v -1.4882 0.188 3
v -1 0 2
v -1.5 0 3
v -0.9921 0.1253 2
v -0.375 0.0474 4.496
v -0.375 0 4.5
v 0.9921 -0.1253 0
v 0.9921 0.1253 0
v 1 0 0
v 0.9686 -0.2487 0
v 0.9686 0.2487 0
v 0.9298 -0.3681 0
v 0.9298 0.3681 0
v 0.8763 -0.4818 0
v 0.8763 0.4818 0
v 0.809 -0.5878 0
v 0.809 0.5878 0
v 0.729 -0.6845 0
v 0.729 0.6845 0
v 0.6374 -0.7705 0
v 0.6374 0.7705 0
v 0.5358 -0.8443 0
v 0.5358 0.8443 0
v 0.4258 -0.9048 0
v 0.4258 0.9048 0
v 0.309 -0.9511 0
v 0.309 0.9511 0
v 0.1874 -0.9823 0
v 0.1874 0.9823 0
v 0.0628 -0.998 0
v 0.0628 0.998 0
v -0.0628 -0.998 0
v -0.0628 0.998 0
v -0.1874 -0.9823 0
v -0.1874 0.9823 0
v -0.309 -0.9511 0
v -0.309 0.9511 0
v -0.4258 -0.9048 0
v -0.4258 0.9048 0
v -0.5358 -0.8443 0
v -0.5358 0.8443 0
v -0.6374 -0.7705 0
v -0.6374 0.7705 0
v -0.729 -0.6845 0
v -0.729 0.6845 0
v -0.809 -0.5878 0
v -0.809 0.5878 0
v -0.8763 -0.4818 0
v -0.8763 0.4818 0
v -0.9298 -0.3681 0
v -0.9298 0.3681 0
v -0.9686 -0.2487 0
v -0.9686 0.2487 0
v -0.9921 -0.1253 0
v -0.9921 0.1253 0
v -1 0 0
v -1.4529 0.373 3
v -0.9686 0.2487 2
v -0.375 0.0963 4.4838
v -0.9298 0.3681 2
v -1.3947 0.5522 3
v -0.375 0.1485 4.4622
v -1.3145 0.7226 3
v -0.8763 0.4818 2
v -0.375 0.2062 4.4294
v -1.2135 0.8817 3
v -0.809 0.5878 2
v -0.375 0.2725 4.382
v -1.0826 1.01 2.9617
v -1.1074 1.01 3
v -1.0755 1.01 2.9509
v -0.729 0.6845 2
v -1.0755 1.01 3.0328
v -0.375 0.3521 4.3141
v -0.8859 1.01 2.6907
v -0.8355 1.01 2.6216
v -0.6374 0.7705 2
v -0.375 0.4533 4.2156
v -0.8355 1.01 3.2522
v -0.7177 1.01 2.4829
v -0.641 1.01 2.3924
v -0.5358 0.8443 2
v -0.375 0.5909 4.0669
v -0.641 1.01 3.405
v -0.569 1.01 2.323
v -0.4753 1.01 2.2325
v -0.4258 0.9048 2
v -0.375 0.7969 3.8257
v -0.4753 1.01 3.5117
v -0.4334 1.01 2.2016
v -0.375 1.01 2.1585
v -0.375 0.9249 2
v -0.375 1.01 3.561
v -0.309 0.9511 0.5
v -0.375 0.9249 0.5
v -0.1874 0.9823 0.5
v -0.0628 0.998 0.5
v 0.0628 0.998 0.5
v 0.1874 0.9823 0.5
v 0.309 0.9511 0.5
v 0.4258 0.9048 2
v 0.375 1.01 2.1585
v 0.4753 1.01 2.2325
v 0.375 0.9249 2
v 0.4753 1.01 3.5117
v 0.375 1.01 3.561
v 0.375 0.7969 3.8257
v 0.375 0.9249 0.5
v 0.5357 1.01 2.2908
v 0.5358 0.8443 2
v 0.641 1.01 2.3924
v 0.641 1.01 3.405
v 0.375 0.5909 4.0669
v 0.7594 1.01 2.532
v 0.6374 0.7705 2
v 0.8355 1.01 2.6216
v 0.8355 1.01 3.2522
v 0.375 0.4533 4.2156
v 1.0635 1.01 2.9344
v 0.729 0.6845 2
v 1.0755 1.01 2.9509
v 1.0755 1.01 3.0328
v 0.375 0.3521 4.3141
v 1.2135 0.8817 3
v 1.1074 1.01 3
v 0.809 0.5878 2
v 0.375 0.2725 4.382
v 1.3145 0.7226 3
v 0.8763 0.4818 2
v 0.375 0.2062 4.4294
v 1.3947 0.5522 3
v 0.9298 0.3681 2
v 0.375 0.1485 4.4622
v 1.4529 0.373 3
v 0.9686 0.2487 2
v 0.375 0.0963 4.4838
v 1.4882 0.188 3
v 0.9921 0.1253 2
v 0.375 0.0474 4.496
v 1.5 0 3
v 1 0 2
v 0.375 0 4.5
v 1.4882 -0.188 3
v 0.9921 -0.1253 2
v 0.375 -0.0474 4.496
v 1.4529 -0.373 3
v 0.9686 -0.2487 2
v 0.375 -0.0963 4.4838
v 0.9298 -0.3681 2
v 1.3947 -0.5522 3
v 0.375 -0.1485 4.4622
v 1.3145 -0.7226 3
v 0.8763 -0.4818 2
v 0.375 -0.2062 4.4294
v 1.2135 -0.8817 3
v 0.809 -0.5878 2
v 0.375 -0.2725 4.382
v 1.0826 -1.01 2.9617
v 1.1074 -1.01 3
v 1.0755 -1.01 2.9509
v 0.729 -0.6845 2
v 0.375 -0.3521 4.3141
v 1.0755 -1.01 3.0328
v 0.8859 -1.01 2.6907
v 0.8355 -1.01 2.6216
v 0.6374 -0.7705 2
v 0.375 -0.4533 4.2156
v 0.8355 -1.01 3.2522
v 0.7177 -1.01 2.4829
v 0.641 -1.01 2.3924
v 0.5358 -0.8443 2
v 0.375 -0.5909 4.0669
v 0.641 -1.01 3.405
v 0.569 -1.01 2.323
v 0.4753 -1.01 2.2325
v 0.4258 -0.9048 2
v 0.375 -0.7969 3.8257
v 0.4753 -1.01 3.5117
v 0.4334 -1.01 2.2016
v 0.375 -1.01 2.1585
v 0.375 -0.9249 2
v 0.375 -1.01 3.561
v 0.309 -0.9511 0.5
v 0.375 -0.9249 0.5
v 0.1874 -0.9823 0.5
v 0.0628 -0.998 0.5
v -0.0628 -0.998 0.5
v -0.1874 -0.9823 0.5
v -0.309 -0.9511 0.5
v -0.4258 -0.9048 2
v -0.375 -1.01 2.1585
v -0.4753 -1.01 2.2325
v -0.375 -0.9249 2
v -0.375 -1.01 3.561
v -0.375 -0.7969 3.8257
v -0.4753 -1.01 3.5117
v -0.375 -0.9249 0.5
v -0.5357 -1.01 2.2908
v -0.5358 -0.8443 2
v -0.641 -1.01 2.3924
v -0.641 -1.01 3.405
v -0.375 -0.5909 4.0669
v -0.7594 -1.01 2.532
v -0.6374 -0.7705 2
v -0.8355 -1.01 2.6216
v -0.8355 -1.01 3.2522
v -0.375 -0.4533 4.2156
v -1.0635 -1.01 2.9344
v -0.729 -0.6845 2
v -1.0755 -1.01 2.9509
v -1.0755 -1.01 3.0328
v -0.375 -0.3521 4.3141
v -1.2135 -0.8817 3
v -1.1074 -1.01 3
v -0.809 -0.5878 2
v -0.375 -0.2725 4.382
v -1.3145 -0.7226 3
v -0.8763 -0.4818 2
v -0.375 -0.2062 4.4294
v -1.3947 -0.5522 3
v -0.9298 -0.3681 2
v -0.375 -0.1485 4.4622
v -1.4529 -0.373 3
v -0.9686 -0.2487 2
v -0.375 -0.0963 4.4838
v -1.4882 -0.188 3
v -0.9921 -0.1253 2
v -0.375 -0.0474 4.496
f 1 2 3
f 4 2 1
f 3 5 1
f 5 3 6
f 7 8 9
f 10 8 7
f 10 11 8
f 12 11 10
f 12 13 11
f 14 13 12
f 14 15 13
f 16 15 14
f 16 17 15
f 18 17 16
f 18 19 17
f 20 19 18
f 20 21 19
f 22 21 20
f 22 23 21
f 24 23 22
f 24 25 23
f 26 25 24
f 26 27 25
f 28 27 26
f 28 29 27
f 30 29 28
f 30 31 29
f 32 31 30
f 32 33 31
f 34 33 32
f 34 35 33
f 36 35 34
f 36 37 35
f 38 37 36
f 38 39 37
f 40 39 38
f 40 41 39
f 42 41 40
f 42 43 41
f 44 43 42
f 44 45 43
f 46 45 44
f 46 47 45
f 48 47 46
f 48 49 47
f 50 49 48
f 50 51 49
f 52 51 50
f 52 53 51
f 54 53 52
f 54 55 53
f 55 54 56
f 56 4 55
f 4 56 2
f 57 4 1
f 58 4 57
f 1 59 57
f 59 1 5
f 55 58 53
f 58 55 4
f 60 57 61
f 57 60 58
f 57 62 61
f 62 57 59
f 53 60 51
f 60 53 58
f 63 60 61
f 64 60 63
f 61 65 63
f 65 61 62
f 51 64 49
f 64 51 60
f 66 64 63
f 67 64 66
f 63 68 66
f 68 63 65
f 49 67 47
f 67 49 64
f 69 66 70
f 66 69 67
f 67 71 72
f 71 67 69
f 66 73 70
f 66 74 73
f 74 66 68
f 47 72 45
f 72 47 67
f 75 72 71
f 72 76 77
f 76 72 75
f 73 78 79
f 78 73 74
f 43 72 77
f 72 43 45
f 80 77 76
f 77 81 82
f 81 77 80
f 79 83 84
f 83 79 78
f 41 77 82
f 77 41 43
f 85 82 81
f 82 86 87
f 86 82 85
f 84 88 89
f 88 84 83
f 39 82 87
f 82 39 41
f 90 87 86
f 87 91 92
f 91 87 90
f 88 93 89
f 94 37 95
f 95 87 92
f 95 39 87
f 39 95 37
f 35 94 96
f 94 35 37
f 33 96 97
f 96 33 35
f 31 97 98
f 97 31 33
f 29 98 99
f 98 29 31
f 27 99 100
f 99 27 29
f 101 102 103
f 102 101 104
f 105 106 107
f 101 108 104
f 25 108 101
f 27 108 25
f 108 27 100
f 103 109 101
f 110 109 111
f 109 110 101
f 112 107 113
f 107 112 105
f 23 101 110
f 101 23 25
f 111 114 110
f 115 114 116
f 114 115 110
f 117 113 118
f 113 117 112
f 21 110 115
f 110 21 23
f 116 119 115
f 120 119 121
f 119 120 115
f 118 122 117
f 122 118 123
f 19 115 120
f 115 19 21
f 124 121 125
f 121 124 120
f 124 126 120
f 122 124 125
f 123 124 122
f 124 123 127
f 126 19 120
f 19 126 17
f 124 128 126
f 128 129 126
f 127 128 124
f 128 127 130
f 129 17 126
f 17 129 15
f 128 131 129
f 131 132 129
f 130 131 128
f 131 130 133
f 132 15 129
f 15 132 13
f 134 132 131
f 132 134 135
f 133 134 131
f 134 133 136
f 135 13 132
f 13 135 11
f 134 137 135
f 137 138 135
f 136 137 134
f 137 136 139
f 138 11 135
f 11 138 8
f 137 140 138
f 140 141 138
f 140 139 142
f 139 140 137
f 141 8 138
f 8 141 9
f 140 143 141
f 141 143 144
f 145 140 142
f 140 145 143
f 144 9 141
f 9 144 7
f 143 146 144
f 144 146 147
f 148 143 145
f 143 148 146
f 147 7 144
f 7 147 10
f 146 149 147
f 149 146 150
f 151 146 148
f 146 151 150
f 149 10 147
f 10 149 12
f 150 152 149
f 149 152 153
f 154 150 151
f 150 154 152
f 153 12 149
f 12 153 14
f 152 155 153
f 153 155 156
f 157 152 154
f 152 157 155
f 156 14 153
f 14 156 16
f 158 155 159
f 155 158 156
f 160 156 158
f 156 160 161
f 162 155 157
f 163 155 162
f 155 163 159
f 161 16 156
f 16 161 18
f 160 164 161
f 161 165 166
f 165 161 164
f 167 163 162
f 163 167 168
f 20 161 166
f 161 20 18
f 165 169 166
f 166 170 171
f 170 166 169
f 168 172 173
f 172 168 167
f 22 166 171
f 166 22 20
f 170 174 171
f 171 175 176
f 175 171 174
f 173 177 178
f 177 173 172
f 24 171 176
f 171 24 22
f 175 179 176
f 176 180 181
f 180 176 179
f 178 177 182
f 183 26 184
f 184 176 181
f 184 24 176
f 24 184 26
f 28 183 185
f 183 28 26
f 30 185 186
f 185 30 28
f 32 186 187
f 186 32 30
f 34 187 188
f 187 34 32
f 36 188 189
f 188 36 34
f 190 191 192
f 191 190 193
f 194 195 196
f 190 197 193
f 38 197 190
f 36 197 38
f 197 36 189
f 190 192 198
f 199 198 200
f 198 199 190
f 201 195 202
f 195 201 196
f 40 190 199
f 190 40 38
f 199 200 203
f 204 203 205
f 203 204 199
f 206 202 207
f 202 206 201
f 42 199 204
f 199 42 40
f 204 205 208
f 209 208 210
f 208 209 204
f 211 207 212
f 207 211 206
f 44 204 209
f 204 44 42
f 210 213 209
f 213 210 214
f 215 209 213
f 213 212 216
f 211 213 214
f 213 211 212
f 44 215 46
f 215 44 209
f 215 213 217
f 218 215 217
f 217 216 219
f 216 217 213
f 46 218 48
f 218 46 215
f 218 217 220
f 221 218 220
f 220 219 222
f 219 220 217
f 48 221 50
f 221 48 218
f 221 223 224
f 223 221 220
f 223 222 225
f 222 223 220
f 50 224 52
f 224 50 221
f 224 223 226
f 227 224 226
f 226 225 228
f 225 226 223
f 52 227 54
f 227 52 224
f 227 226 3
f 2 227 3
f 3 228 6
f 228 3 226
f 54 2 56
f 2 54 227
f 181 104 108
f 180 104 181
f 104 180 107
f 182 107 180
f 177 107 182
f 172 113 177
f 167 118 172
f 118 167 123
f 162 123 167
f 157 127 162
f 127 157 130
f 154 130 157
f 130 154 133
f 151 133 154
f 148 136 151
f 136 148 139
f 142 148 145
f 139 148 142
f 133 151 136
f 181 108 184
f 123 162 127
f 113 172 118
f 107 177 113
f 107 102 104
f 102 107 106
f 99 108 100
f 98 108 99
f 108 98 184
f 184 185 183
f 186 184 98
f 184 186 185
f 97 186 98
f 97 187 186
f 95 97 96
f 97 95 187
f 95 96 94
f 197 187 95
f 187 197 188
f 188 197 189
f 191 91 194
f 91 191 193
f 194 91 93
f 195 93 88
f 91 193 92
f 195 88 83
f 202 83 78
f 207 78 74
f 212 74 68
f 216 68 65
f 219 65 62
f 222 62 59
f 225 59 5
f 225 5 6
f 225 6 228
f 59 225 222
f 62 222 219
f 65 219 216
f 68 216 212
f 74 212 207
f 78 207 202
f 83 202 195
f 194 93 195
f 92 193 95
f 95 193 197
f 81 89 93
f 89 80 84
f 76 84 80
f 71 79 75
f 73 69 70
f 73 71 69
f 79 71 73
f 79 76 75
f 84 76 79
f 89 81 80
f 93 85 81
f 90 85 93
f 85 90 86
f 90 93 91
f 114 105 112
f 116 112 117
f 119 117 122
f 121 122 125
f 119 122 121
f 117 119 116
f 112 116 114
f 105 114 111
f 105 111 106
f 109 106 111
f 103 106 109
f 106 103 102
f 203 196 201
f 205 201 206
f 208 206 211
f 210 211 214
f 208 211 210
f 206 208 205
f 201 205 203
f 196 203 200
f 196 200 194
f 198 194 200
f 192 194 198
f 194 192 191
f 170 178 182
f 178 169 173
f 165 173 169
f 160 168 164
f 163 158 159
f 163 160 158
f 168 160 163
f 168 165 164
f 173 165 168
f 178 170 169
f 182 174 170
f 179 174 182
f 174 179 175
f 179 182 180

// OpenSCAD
$fn=50;

module no_overhang_f () {
	rotate_extrude(convexity=10) {
		polygon([[0,5],[1.5,3],[1,2],[1,0],[3,0],[3,5]],[[0,1,2,3,4,5,0]]);
	}
}

module no_overhang_m () {
	difference(convexity=10) {
		rotate_extrude(convexity=10) {
			polygon([[0,5],[1.5,3],[1,2],[1,0],[0,0],[0,5]],[[0,1,2,3,4,5,0]]);
		}
		translate([0,0,3]) cube([.75,5,5], center=true);
		translate([0,2.01,0]) rotate([0,0,90]) cube([2,5,10], center=true);
		translate([0,-2.01,0]) rotate([0,0,90]) cube([2,5,10], center=true);
	}
}

// cutaway view
difference(convexity=10) {
	no_overhang_f();
	translate([0,4,0]) cube([8,8,12], center=true);
}
no_overhang_m();
